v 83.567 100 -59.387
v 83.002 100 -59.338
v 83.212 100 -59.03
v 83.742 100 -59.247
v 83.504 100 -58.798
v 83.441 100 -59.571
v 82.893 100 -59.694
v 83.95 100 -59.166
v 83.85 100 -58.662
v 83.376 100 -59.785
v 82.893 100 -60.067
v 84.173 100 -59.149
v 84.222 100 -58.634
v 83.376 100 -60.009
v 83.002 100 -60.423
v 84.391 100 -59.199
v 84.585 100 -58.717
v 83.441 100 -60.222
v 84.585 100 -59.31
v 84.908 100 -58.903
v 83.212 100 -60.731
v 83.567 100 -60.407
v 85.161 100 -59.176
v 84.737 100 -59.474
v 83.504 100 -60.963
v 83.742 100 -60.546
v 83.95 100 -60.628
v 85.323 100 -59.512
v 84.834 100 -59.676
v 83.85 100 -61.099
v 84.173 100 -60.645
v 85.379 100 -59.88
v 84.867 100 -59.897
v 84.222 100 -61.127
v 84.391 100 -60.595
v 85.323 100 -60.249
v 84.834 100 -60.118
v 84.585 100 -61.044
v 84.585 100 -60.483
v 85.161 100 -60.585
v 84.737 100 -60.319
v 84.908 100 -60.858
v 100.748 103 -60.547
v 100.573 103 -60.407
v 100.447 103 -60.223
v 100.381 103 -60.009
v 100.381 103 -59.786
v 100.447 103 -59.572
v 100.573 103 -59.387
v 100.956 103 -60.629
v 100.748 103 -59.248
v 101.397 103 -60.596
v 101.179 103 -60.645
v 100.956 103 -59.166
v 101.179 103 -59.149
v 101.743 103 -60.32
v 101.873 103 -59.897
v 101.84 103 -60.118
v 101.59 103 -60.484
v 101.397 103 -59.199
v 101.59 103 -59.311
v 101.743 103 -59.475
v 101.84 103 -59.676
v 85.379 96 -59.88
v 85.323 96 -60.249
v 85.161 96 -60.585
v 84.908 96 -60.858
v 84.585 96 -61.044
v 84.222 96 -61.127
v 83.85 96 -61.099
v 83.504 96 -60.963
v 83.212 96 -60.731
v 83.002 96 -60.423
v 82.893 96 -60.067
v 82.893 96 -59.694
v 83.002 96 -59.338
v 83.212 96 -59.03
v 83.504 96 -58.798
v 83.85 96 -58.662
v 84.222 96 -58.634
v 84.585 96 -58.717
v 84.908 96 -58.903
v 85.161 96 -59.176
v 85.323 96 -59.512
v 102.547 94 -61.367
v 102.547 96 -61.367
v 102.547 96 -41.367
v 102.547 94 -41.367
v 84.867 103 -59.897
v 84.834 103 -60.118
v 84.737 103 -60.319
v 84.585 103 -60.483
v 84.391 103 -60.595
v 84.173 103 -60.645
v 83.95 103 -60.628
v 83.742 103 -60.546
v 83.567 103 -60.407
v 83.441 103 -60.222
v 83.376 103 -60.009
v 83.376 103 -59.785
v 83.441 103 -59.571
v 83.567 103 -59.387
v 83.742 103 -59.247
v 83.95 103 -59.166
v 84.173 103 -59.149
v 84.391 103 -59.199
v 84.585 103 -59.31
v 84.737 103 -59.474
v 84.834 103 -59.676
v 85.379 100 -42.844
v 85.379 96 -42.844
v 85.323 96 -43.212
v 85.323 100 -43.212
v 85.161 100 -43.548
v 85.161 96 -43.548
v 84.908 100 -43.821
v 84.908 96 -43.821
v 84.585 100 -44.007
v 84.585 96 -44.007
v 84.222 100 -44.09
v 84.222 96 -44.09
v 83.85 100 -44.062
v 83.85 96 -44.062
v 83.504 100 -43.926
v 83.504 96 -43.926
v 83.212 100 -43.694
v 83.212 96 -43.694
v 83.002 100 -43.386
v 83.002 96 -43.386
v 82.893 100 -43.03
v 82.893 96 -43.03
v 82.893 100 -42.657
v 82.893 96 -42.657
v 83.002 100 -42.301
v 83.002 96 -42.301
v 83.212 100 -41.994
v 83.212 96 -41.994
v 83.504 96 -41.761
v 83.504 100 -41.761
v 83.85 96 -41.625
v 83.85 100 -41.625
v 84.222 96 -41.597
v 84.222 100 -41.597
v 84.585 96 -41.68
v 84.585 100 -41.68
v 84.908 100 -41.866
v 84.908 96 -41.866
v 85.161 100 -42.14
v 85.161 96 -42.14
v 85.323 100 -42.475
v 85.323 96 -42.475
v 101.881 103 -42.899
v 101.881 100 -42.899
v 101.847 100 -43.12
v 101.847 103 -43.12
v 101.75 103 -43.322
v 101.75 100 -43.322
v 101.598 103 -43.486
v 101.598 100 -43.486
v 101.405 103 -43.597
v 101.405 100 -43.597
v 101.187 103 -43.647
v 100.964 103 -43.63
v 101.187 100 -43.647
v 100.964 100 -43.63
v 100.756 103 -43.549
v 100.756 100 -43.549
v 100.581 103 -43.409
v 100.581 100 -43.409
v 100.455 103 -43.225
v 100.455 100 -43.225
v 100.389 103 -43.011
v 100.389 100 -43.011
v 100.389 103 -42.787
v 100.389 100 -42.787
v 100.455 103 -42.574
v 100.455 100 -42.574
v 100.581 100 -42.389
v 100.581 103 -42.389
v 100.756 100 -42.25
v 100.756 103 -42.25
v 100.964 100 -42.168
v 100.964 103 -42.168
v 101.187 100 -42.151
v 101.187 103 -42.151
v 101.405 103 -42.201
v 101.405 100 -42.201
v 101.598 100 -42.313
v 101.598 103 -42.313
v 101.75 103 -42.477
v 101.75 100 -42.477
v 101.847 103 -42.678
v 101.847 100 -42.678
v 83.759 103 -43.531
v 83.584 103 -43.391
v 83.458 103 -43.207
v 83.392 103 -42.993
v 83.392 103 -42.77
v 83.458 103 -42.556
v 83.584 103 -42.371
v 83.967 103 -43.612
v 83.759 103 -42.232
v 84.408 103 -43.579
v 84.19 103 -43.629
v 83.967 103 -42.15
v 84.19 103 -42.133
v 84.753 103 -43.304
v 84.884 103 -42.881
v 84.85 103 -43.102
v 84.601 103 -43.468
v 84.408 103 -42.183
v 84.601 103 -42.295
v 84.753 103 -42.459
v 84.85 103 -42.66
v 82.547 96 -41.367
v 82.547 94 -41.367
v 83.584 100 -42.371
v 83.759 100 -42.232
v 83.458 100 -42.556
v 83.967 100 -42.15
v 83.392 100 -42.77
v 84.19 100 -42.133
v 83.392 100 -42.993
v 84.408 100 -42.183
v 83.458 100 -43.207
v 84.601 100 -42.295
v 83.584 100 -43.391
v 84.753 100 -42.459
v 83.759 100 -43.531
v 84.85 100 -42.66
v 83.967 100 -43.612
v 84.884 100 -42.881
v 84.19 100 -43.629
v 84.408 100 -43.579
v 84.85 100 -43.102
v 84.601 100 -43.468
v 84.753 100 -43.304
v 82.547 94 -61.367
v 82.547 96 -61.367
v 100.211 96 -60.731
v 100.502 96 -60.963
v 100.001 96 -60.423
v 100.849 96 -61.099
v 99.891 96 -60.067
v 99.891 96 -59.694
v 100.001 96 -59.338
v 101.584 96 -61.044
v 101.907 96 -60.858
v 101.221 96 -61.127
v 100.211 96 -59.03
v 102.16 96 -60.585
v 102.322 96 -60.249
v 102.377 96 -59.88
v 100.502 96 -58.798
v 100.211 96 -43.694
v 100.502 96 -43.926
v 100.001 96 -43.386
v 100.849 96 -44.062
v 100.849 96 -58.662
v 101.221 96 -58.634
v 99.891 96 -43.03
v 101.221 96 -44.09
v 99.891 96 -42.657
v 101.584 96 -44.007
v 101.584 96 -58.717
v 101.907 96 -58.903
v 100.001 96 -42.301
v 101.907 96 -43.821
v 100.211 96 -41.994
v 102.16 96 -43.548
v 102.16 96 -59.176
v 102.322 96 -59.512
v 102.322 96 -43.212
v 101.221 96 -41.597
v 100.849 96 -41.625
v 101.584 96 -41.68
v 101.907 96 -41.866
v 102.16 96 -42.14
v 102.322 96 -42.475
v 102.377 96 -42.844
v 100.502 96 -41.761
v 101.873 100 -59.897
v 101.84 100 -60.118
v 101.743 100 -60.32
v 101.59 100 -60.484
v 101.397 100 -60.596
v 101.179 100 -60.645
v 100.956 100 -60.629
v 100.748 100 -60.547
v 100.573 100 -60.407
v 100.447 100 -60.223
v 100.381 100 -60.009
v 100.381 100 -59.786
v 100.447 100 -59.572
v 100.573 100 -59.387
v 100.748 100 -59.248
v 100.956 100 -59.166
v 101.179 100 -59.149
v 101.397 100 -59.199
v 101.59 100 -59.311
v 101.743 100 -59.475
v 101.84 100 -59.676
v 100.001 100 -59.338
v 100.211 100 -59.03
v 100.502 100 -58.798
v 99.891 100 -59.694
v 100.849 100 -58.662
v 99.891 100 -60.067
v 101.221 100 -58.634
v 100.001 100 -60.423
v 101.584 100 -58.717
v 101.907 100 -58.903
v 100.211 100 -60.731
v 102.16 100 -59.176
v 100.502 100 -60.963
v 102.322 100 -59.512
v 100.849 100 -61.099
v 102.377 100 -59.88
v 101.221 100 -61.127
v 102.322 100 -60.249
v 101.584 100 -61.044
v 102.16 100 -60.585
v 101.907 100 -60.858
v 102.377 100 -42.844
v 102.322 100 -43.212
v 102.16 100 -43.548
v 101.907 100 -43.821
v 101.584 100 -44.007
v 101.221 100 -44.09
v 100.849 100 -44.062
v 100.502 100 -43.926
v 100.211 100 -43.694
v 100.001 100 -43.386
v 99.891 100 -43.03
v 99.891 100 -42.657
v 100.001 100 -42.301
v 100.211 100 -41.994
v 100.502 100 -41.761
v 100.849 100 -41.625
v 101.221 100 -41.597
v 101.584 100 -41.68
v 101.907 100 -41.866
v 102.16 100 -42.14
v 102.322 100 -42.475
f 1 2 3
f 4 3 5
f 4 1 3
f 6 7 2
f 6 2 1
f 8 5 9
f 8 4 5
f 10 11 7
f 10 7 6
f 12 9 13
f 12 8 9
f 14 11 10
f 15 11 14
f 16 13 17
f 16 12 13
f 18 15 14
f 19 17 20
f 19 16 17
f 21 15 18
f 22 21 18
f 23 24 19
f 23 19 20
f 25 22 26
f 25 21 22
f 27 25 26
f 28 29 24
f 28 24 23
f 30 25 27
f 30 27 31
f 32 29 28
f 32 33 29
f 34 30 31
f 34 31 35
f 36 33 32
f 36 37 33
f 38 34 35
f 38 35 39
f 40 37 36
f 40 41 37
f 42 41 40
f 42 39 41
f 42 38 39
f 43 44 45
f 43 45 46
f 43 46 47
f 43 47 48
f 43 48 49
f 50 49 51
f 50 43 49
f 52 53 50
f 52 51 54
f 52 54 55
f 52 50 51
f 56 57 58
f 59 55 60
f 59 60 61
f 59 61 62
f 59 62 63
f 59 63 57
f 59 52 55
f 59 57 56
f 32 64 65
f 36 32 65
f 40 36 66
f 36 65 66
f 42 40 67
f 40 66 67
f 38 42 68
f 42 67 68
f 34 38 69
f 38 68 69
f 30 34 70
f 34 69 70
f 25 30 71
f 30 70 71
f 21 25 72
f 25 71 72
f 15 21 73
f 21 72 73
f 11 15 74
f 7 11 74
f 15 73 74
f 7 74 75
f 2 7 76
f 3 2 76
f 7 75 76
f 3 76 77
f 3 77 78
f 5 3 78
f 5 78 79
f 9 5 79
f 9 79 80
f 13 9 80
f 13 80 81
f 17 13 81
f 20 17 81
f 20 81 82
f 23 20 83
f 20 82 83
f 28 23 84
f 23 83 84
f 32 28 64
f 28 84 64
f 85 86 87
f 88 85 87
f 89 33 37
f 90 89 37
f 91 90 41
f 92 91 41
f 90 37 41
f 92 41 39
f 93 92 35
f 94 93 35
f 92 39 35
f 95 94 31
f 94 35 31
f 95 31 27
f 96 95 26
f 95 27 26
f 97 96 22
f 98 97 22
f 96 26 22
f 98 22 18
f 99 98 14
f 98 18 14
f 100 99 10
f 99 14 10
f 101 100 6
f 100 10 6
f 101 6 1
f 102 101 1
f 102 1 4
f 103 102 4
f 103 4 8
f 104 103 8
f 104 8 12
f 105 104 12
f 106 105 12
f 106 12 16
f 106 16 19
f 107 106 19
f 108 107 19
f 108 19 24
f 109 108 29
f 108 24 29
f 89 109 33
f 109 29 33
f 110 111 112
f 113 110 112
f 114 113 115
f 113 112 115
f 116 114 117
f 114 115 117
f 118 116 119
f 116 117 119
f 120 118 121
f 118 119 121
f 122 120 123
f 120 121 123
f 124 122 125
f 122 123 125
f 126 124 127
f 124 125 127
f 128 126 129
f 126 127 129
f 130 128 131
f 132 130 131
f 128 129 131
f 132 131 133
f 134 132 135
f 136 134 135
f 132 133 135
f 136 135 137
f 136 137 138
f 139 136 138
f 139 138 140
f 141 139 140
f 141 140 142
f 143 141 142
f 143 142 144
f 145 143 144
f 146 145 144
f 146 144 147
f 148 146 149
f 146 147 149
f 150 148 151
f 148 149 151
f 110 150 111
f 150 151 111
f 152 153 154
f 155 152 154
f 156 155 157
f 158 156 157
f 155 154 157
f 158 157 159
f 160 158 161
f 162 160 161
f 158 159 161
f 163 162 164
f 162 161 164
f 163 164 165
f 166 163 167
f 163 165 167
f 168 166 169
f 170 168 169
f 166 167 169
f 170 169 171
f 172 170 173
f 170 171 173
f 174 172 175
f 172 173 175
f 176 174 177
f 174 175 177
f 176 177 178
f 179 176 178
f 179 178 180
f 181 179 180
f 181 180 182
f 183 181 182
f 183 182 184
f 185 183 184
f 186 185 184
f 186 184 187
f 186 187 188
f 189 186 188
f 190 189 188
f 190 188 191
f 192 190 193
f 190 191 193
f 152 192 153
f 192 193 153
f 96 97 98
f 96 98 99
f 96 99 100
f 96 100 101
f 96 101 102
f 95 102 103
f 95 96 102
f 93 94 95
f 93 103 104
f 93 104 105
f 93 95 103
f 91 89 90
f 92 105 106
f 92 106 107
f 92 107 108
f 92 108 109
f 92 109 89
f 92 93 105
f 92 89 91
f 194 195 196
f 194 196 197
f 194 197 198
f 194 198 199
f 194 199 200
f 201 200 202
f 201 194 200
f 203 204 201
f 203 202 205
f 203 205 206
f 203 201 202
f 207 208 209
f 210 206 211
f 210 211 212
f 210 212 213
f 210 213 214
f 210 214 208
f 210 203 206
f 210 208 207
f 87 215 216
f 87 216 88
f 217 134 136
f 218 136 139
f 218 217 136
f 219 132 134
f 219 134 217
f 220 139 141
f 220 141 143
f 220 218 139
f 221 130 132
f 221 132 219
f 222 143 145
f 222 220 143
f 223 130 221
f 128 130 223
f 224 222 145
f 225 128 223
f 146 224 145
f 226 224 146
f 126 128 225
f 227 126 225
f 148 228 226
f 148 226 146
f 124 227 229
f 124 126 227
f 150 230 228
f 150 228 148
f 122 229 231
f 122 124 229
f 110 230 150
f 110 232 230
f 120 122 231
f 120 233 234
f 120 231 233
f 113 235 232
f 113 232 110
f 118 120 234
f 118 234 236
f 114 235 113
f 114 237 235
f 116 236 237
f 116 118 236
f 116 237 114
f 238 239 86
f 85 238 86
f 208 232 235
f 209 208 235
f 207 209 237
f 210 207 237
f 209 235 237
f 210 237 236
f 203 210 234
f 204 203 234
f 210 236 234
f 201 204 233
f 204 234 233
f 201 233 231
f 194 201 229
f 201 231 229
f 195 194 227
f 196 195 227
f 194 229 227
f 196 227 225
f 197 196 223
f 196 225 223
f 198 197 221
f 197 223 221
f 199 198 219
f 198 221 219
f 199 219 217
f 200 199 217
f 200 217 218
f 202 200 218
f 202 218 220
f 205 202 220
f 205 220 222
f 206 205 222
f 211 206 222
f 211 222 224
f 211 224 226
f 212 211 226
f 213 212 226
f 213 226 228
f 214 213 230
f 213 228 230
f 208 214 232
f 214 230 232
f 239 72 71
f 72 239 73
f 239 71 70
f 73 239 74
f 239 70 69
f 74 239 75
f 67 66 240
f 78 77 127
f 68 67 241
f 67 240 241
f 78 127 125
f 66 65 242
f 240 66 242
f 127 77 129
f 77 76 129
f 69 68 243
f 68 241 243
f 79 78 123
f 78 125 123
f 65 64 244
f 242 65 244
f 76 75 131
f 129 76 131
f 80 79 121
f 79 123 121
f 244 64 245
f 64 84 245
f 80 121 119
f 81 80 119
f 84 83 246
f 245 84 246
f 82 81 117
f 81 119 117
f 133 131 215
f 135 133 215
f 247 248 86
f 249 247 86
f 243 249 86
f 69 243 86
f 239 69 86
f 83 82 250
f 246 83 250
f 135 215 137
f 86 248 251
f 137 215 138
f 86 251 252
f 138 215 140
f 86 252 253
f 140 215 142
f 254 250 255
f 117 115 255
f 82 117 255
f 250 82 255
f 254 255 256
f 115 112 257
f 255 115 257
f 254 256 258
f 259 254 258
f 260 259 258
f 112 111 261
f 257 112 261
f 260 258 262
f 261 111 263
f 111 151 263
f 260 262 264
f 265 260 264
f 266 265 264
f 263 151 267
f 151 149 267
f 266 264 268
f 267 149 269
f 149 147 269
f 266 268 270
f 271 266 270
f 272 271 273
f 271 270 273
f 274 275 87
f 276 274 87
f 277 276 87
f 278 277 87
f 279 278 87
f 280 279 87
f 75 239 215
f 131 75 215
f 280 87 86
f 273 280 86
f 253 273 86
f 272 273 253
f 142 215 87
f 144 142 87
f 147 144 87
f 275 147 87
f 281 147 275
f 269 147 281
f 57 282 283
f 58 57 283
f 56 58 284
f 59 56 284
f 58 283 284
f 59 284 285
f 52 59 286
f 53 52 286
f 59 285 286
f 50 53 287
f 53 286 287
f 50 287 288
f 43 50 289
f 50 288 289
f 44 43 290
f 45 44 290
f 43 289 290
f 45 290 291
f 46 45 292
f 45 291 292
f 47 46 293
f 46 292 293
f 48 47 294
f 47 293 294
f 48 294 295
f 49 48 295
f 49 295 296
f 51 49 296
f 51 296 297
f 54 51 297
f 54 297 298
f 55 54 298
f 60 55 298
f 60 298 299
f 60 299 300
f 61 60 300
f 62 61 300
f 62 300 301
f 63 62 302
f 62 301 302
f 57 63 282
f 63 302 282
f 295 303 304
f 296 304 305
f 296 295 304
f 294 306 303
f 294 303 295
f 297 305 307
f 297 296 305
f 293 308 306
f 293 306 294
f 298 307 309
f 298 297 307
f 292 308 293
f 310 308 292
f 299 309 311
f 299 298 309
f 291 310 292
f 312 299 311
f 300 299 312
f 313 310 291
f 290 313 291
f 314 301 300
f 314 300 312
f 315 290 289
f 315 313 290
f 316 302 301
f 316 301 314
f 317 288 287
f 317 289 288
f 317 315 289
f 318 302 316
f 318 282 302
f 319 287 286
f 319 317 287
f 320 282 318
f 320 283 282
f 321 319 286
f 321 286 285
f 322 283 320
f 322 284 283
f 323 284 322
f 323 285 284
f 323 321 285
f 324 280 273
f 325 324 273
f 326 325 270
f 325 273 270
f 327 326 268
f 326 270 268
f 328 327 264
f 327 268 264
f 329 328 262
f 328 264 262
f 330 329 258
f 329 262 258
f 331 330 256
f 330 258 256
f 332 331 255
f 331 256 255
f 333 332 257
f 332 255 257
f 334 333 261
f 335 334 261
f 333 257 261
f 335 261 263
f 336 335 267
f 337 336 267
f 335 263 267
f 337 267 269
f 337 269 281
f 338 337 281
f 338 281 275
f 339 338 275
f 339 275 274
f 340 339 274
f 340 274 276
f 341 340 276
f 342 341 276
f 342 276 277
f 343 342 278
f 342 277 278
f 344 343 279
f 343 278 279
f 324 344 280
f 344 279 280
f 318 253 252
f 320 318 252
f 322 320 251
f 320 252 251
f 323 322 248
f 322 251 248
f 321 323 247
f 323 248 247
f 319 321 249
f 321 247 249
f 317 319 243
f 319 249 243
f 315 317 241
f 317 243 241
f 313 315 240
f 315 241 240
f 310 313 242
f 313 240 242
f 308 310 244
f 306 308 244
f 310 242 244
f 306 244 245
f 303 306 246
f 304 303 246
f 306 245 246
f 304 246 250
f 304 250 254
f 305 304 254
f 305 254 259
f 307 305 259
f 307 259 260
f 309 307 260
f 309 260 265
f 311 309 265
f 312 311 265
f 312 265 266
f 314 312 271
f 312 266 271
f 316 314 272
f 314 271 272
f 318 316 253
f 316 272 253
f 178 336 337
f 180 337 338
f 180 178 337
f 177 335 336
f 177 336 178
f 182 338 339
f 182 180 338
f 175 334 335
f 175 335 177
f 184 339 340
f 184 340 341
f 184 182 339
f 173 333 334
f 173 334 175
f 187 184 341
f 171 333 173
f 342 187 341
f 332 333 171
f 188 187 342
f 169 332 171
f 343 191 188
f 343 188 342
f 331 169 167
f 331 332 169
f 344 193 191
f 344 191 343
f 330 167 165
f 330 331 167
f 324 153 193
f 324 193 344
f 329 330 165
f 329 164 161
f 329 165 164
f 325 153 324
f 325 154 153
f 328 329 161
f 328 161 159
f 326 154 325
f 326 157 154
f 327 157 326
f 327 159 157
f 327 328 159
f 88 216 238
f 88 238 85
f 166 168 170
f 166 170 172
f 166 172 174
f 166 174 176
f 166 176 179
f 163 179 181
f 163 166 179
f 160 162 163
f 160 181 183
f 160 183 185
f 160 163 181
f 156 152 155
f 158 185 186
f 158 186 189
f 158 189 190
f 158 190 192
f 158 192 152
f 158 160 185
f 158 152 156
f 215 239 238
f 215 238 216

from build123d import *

# Parameters (mm, degrees)
SKETCH066_W  = 20
SKETCH066_H  = 20
PAD025_DEPTH = 2
SKETCH067_R  = 1.25
PAD026_DEPTH = 4
SKETCH068_R  = 0.75
PAD027_DEPTH = 3


with BuildPart() as part:
    # Sketch066 → Pad025 (new body)
    with BuildSketch(Plane.XZ):
        with Locations((92.5474607125, -51.3671462774)):
            Rectangle(SKETCH066_W, SKETCH066_H)
    extrude(amount=PAD025_DEPTH)

    # Sketch067 (on Face5 of Pad025) → Pad026 (join)
    with BuildSketch(Plane(origin=(0, 0, 0), x_dir=(1, 0, 0), z_dir=(0, 1, 0))):
        with Locations((84.128586, 59.880451)):
            Circle(SKETCH067_R)
        with Locations((101.127403, 59.880451)):
            Circle(SKETCH067_R)
        with Locations((101.127403, 42.843773)):
            Circle(SKETCH067_R)
        with Locations((84.128586, 42.843773)):
            Circle(SKETCH067_R)
    extrude(amount=PAD026_DEPTH)

    # Sketch068 (on Face14 of Pad026) → Pad027 (join)
    with BuildSketch(Plane(origin=(0, 4, 0), x_dir=(1, 0, 0), z_dir=(0, 1, 0))):
        with Locations((84.117188, 59.896854)):
            Circle(SKETCH068_R)
        with Locations((101.122879, 59.897358)):
            Circle(SKETCH068_R)
        with Locations((101.130592, 42.899231)):
            Circle(SKETCH068_R)
        with Locations((84.133583, 42.881302)):
            Circle(SKETCH068_R)
    extrude(amount=PAD027_DEPTH)


with BuildPart() as part_1:
    # Body009 placement: moved
    add(part.part.moved(Location((0, 96, 0))))


solid = part_1.part
